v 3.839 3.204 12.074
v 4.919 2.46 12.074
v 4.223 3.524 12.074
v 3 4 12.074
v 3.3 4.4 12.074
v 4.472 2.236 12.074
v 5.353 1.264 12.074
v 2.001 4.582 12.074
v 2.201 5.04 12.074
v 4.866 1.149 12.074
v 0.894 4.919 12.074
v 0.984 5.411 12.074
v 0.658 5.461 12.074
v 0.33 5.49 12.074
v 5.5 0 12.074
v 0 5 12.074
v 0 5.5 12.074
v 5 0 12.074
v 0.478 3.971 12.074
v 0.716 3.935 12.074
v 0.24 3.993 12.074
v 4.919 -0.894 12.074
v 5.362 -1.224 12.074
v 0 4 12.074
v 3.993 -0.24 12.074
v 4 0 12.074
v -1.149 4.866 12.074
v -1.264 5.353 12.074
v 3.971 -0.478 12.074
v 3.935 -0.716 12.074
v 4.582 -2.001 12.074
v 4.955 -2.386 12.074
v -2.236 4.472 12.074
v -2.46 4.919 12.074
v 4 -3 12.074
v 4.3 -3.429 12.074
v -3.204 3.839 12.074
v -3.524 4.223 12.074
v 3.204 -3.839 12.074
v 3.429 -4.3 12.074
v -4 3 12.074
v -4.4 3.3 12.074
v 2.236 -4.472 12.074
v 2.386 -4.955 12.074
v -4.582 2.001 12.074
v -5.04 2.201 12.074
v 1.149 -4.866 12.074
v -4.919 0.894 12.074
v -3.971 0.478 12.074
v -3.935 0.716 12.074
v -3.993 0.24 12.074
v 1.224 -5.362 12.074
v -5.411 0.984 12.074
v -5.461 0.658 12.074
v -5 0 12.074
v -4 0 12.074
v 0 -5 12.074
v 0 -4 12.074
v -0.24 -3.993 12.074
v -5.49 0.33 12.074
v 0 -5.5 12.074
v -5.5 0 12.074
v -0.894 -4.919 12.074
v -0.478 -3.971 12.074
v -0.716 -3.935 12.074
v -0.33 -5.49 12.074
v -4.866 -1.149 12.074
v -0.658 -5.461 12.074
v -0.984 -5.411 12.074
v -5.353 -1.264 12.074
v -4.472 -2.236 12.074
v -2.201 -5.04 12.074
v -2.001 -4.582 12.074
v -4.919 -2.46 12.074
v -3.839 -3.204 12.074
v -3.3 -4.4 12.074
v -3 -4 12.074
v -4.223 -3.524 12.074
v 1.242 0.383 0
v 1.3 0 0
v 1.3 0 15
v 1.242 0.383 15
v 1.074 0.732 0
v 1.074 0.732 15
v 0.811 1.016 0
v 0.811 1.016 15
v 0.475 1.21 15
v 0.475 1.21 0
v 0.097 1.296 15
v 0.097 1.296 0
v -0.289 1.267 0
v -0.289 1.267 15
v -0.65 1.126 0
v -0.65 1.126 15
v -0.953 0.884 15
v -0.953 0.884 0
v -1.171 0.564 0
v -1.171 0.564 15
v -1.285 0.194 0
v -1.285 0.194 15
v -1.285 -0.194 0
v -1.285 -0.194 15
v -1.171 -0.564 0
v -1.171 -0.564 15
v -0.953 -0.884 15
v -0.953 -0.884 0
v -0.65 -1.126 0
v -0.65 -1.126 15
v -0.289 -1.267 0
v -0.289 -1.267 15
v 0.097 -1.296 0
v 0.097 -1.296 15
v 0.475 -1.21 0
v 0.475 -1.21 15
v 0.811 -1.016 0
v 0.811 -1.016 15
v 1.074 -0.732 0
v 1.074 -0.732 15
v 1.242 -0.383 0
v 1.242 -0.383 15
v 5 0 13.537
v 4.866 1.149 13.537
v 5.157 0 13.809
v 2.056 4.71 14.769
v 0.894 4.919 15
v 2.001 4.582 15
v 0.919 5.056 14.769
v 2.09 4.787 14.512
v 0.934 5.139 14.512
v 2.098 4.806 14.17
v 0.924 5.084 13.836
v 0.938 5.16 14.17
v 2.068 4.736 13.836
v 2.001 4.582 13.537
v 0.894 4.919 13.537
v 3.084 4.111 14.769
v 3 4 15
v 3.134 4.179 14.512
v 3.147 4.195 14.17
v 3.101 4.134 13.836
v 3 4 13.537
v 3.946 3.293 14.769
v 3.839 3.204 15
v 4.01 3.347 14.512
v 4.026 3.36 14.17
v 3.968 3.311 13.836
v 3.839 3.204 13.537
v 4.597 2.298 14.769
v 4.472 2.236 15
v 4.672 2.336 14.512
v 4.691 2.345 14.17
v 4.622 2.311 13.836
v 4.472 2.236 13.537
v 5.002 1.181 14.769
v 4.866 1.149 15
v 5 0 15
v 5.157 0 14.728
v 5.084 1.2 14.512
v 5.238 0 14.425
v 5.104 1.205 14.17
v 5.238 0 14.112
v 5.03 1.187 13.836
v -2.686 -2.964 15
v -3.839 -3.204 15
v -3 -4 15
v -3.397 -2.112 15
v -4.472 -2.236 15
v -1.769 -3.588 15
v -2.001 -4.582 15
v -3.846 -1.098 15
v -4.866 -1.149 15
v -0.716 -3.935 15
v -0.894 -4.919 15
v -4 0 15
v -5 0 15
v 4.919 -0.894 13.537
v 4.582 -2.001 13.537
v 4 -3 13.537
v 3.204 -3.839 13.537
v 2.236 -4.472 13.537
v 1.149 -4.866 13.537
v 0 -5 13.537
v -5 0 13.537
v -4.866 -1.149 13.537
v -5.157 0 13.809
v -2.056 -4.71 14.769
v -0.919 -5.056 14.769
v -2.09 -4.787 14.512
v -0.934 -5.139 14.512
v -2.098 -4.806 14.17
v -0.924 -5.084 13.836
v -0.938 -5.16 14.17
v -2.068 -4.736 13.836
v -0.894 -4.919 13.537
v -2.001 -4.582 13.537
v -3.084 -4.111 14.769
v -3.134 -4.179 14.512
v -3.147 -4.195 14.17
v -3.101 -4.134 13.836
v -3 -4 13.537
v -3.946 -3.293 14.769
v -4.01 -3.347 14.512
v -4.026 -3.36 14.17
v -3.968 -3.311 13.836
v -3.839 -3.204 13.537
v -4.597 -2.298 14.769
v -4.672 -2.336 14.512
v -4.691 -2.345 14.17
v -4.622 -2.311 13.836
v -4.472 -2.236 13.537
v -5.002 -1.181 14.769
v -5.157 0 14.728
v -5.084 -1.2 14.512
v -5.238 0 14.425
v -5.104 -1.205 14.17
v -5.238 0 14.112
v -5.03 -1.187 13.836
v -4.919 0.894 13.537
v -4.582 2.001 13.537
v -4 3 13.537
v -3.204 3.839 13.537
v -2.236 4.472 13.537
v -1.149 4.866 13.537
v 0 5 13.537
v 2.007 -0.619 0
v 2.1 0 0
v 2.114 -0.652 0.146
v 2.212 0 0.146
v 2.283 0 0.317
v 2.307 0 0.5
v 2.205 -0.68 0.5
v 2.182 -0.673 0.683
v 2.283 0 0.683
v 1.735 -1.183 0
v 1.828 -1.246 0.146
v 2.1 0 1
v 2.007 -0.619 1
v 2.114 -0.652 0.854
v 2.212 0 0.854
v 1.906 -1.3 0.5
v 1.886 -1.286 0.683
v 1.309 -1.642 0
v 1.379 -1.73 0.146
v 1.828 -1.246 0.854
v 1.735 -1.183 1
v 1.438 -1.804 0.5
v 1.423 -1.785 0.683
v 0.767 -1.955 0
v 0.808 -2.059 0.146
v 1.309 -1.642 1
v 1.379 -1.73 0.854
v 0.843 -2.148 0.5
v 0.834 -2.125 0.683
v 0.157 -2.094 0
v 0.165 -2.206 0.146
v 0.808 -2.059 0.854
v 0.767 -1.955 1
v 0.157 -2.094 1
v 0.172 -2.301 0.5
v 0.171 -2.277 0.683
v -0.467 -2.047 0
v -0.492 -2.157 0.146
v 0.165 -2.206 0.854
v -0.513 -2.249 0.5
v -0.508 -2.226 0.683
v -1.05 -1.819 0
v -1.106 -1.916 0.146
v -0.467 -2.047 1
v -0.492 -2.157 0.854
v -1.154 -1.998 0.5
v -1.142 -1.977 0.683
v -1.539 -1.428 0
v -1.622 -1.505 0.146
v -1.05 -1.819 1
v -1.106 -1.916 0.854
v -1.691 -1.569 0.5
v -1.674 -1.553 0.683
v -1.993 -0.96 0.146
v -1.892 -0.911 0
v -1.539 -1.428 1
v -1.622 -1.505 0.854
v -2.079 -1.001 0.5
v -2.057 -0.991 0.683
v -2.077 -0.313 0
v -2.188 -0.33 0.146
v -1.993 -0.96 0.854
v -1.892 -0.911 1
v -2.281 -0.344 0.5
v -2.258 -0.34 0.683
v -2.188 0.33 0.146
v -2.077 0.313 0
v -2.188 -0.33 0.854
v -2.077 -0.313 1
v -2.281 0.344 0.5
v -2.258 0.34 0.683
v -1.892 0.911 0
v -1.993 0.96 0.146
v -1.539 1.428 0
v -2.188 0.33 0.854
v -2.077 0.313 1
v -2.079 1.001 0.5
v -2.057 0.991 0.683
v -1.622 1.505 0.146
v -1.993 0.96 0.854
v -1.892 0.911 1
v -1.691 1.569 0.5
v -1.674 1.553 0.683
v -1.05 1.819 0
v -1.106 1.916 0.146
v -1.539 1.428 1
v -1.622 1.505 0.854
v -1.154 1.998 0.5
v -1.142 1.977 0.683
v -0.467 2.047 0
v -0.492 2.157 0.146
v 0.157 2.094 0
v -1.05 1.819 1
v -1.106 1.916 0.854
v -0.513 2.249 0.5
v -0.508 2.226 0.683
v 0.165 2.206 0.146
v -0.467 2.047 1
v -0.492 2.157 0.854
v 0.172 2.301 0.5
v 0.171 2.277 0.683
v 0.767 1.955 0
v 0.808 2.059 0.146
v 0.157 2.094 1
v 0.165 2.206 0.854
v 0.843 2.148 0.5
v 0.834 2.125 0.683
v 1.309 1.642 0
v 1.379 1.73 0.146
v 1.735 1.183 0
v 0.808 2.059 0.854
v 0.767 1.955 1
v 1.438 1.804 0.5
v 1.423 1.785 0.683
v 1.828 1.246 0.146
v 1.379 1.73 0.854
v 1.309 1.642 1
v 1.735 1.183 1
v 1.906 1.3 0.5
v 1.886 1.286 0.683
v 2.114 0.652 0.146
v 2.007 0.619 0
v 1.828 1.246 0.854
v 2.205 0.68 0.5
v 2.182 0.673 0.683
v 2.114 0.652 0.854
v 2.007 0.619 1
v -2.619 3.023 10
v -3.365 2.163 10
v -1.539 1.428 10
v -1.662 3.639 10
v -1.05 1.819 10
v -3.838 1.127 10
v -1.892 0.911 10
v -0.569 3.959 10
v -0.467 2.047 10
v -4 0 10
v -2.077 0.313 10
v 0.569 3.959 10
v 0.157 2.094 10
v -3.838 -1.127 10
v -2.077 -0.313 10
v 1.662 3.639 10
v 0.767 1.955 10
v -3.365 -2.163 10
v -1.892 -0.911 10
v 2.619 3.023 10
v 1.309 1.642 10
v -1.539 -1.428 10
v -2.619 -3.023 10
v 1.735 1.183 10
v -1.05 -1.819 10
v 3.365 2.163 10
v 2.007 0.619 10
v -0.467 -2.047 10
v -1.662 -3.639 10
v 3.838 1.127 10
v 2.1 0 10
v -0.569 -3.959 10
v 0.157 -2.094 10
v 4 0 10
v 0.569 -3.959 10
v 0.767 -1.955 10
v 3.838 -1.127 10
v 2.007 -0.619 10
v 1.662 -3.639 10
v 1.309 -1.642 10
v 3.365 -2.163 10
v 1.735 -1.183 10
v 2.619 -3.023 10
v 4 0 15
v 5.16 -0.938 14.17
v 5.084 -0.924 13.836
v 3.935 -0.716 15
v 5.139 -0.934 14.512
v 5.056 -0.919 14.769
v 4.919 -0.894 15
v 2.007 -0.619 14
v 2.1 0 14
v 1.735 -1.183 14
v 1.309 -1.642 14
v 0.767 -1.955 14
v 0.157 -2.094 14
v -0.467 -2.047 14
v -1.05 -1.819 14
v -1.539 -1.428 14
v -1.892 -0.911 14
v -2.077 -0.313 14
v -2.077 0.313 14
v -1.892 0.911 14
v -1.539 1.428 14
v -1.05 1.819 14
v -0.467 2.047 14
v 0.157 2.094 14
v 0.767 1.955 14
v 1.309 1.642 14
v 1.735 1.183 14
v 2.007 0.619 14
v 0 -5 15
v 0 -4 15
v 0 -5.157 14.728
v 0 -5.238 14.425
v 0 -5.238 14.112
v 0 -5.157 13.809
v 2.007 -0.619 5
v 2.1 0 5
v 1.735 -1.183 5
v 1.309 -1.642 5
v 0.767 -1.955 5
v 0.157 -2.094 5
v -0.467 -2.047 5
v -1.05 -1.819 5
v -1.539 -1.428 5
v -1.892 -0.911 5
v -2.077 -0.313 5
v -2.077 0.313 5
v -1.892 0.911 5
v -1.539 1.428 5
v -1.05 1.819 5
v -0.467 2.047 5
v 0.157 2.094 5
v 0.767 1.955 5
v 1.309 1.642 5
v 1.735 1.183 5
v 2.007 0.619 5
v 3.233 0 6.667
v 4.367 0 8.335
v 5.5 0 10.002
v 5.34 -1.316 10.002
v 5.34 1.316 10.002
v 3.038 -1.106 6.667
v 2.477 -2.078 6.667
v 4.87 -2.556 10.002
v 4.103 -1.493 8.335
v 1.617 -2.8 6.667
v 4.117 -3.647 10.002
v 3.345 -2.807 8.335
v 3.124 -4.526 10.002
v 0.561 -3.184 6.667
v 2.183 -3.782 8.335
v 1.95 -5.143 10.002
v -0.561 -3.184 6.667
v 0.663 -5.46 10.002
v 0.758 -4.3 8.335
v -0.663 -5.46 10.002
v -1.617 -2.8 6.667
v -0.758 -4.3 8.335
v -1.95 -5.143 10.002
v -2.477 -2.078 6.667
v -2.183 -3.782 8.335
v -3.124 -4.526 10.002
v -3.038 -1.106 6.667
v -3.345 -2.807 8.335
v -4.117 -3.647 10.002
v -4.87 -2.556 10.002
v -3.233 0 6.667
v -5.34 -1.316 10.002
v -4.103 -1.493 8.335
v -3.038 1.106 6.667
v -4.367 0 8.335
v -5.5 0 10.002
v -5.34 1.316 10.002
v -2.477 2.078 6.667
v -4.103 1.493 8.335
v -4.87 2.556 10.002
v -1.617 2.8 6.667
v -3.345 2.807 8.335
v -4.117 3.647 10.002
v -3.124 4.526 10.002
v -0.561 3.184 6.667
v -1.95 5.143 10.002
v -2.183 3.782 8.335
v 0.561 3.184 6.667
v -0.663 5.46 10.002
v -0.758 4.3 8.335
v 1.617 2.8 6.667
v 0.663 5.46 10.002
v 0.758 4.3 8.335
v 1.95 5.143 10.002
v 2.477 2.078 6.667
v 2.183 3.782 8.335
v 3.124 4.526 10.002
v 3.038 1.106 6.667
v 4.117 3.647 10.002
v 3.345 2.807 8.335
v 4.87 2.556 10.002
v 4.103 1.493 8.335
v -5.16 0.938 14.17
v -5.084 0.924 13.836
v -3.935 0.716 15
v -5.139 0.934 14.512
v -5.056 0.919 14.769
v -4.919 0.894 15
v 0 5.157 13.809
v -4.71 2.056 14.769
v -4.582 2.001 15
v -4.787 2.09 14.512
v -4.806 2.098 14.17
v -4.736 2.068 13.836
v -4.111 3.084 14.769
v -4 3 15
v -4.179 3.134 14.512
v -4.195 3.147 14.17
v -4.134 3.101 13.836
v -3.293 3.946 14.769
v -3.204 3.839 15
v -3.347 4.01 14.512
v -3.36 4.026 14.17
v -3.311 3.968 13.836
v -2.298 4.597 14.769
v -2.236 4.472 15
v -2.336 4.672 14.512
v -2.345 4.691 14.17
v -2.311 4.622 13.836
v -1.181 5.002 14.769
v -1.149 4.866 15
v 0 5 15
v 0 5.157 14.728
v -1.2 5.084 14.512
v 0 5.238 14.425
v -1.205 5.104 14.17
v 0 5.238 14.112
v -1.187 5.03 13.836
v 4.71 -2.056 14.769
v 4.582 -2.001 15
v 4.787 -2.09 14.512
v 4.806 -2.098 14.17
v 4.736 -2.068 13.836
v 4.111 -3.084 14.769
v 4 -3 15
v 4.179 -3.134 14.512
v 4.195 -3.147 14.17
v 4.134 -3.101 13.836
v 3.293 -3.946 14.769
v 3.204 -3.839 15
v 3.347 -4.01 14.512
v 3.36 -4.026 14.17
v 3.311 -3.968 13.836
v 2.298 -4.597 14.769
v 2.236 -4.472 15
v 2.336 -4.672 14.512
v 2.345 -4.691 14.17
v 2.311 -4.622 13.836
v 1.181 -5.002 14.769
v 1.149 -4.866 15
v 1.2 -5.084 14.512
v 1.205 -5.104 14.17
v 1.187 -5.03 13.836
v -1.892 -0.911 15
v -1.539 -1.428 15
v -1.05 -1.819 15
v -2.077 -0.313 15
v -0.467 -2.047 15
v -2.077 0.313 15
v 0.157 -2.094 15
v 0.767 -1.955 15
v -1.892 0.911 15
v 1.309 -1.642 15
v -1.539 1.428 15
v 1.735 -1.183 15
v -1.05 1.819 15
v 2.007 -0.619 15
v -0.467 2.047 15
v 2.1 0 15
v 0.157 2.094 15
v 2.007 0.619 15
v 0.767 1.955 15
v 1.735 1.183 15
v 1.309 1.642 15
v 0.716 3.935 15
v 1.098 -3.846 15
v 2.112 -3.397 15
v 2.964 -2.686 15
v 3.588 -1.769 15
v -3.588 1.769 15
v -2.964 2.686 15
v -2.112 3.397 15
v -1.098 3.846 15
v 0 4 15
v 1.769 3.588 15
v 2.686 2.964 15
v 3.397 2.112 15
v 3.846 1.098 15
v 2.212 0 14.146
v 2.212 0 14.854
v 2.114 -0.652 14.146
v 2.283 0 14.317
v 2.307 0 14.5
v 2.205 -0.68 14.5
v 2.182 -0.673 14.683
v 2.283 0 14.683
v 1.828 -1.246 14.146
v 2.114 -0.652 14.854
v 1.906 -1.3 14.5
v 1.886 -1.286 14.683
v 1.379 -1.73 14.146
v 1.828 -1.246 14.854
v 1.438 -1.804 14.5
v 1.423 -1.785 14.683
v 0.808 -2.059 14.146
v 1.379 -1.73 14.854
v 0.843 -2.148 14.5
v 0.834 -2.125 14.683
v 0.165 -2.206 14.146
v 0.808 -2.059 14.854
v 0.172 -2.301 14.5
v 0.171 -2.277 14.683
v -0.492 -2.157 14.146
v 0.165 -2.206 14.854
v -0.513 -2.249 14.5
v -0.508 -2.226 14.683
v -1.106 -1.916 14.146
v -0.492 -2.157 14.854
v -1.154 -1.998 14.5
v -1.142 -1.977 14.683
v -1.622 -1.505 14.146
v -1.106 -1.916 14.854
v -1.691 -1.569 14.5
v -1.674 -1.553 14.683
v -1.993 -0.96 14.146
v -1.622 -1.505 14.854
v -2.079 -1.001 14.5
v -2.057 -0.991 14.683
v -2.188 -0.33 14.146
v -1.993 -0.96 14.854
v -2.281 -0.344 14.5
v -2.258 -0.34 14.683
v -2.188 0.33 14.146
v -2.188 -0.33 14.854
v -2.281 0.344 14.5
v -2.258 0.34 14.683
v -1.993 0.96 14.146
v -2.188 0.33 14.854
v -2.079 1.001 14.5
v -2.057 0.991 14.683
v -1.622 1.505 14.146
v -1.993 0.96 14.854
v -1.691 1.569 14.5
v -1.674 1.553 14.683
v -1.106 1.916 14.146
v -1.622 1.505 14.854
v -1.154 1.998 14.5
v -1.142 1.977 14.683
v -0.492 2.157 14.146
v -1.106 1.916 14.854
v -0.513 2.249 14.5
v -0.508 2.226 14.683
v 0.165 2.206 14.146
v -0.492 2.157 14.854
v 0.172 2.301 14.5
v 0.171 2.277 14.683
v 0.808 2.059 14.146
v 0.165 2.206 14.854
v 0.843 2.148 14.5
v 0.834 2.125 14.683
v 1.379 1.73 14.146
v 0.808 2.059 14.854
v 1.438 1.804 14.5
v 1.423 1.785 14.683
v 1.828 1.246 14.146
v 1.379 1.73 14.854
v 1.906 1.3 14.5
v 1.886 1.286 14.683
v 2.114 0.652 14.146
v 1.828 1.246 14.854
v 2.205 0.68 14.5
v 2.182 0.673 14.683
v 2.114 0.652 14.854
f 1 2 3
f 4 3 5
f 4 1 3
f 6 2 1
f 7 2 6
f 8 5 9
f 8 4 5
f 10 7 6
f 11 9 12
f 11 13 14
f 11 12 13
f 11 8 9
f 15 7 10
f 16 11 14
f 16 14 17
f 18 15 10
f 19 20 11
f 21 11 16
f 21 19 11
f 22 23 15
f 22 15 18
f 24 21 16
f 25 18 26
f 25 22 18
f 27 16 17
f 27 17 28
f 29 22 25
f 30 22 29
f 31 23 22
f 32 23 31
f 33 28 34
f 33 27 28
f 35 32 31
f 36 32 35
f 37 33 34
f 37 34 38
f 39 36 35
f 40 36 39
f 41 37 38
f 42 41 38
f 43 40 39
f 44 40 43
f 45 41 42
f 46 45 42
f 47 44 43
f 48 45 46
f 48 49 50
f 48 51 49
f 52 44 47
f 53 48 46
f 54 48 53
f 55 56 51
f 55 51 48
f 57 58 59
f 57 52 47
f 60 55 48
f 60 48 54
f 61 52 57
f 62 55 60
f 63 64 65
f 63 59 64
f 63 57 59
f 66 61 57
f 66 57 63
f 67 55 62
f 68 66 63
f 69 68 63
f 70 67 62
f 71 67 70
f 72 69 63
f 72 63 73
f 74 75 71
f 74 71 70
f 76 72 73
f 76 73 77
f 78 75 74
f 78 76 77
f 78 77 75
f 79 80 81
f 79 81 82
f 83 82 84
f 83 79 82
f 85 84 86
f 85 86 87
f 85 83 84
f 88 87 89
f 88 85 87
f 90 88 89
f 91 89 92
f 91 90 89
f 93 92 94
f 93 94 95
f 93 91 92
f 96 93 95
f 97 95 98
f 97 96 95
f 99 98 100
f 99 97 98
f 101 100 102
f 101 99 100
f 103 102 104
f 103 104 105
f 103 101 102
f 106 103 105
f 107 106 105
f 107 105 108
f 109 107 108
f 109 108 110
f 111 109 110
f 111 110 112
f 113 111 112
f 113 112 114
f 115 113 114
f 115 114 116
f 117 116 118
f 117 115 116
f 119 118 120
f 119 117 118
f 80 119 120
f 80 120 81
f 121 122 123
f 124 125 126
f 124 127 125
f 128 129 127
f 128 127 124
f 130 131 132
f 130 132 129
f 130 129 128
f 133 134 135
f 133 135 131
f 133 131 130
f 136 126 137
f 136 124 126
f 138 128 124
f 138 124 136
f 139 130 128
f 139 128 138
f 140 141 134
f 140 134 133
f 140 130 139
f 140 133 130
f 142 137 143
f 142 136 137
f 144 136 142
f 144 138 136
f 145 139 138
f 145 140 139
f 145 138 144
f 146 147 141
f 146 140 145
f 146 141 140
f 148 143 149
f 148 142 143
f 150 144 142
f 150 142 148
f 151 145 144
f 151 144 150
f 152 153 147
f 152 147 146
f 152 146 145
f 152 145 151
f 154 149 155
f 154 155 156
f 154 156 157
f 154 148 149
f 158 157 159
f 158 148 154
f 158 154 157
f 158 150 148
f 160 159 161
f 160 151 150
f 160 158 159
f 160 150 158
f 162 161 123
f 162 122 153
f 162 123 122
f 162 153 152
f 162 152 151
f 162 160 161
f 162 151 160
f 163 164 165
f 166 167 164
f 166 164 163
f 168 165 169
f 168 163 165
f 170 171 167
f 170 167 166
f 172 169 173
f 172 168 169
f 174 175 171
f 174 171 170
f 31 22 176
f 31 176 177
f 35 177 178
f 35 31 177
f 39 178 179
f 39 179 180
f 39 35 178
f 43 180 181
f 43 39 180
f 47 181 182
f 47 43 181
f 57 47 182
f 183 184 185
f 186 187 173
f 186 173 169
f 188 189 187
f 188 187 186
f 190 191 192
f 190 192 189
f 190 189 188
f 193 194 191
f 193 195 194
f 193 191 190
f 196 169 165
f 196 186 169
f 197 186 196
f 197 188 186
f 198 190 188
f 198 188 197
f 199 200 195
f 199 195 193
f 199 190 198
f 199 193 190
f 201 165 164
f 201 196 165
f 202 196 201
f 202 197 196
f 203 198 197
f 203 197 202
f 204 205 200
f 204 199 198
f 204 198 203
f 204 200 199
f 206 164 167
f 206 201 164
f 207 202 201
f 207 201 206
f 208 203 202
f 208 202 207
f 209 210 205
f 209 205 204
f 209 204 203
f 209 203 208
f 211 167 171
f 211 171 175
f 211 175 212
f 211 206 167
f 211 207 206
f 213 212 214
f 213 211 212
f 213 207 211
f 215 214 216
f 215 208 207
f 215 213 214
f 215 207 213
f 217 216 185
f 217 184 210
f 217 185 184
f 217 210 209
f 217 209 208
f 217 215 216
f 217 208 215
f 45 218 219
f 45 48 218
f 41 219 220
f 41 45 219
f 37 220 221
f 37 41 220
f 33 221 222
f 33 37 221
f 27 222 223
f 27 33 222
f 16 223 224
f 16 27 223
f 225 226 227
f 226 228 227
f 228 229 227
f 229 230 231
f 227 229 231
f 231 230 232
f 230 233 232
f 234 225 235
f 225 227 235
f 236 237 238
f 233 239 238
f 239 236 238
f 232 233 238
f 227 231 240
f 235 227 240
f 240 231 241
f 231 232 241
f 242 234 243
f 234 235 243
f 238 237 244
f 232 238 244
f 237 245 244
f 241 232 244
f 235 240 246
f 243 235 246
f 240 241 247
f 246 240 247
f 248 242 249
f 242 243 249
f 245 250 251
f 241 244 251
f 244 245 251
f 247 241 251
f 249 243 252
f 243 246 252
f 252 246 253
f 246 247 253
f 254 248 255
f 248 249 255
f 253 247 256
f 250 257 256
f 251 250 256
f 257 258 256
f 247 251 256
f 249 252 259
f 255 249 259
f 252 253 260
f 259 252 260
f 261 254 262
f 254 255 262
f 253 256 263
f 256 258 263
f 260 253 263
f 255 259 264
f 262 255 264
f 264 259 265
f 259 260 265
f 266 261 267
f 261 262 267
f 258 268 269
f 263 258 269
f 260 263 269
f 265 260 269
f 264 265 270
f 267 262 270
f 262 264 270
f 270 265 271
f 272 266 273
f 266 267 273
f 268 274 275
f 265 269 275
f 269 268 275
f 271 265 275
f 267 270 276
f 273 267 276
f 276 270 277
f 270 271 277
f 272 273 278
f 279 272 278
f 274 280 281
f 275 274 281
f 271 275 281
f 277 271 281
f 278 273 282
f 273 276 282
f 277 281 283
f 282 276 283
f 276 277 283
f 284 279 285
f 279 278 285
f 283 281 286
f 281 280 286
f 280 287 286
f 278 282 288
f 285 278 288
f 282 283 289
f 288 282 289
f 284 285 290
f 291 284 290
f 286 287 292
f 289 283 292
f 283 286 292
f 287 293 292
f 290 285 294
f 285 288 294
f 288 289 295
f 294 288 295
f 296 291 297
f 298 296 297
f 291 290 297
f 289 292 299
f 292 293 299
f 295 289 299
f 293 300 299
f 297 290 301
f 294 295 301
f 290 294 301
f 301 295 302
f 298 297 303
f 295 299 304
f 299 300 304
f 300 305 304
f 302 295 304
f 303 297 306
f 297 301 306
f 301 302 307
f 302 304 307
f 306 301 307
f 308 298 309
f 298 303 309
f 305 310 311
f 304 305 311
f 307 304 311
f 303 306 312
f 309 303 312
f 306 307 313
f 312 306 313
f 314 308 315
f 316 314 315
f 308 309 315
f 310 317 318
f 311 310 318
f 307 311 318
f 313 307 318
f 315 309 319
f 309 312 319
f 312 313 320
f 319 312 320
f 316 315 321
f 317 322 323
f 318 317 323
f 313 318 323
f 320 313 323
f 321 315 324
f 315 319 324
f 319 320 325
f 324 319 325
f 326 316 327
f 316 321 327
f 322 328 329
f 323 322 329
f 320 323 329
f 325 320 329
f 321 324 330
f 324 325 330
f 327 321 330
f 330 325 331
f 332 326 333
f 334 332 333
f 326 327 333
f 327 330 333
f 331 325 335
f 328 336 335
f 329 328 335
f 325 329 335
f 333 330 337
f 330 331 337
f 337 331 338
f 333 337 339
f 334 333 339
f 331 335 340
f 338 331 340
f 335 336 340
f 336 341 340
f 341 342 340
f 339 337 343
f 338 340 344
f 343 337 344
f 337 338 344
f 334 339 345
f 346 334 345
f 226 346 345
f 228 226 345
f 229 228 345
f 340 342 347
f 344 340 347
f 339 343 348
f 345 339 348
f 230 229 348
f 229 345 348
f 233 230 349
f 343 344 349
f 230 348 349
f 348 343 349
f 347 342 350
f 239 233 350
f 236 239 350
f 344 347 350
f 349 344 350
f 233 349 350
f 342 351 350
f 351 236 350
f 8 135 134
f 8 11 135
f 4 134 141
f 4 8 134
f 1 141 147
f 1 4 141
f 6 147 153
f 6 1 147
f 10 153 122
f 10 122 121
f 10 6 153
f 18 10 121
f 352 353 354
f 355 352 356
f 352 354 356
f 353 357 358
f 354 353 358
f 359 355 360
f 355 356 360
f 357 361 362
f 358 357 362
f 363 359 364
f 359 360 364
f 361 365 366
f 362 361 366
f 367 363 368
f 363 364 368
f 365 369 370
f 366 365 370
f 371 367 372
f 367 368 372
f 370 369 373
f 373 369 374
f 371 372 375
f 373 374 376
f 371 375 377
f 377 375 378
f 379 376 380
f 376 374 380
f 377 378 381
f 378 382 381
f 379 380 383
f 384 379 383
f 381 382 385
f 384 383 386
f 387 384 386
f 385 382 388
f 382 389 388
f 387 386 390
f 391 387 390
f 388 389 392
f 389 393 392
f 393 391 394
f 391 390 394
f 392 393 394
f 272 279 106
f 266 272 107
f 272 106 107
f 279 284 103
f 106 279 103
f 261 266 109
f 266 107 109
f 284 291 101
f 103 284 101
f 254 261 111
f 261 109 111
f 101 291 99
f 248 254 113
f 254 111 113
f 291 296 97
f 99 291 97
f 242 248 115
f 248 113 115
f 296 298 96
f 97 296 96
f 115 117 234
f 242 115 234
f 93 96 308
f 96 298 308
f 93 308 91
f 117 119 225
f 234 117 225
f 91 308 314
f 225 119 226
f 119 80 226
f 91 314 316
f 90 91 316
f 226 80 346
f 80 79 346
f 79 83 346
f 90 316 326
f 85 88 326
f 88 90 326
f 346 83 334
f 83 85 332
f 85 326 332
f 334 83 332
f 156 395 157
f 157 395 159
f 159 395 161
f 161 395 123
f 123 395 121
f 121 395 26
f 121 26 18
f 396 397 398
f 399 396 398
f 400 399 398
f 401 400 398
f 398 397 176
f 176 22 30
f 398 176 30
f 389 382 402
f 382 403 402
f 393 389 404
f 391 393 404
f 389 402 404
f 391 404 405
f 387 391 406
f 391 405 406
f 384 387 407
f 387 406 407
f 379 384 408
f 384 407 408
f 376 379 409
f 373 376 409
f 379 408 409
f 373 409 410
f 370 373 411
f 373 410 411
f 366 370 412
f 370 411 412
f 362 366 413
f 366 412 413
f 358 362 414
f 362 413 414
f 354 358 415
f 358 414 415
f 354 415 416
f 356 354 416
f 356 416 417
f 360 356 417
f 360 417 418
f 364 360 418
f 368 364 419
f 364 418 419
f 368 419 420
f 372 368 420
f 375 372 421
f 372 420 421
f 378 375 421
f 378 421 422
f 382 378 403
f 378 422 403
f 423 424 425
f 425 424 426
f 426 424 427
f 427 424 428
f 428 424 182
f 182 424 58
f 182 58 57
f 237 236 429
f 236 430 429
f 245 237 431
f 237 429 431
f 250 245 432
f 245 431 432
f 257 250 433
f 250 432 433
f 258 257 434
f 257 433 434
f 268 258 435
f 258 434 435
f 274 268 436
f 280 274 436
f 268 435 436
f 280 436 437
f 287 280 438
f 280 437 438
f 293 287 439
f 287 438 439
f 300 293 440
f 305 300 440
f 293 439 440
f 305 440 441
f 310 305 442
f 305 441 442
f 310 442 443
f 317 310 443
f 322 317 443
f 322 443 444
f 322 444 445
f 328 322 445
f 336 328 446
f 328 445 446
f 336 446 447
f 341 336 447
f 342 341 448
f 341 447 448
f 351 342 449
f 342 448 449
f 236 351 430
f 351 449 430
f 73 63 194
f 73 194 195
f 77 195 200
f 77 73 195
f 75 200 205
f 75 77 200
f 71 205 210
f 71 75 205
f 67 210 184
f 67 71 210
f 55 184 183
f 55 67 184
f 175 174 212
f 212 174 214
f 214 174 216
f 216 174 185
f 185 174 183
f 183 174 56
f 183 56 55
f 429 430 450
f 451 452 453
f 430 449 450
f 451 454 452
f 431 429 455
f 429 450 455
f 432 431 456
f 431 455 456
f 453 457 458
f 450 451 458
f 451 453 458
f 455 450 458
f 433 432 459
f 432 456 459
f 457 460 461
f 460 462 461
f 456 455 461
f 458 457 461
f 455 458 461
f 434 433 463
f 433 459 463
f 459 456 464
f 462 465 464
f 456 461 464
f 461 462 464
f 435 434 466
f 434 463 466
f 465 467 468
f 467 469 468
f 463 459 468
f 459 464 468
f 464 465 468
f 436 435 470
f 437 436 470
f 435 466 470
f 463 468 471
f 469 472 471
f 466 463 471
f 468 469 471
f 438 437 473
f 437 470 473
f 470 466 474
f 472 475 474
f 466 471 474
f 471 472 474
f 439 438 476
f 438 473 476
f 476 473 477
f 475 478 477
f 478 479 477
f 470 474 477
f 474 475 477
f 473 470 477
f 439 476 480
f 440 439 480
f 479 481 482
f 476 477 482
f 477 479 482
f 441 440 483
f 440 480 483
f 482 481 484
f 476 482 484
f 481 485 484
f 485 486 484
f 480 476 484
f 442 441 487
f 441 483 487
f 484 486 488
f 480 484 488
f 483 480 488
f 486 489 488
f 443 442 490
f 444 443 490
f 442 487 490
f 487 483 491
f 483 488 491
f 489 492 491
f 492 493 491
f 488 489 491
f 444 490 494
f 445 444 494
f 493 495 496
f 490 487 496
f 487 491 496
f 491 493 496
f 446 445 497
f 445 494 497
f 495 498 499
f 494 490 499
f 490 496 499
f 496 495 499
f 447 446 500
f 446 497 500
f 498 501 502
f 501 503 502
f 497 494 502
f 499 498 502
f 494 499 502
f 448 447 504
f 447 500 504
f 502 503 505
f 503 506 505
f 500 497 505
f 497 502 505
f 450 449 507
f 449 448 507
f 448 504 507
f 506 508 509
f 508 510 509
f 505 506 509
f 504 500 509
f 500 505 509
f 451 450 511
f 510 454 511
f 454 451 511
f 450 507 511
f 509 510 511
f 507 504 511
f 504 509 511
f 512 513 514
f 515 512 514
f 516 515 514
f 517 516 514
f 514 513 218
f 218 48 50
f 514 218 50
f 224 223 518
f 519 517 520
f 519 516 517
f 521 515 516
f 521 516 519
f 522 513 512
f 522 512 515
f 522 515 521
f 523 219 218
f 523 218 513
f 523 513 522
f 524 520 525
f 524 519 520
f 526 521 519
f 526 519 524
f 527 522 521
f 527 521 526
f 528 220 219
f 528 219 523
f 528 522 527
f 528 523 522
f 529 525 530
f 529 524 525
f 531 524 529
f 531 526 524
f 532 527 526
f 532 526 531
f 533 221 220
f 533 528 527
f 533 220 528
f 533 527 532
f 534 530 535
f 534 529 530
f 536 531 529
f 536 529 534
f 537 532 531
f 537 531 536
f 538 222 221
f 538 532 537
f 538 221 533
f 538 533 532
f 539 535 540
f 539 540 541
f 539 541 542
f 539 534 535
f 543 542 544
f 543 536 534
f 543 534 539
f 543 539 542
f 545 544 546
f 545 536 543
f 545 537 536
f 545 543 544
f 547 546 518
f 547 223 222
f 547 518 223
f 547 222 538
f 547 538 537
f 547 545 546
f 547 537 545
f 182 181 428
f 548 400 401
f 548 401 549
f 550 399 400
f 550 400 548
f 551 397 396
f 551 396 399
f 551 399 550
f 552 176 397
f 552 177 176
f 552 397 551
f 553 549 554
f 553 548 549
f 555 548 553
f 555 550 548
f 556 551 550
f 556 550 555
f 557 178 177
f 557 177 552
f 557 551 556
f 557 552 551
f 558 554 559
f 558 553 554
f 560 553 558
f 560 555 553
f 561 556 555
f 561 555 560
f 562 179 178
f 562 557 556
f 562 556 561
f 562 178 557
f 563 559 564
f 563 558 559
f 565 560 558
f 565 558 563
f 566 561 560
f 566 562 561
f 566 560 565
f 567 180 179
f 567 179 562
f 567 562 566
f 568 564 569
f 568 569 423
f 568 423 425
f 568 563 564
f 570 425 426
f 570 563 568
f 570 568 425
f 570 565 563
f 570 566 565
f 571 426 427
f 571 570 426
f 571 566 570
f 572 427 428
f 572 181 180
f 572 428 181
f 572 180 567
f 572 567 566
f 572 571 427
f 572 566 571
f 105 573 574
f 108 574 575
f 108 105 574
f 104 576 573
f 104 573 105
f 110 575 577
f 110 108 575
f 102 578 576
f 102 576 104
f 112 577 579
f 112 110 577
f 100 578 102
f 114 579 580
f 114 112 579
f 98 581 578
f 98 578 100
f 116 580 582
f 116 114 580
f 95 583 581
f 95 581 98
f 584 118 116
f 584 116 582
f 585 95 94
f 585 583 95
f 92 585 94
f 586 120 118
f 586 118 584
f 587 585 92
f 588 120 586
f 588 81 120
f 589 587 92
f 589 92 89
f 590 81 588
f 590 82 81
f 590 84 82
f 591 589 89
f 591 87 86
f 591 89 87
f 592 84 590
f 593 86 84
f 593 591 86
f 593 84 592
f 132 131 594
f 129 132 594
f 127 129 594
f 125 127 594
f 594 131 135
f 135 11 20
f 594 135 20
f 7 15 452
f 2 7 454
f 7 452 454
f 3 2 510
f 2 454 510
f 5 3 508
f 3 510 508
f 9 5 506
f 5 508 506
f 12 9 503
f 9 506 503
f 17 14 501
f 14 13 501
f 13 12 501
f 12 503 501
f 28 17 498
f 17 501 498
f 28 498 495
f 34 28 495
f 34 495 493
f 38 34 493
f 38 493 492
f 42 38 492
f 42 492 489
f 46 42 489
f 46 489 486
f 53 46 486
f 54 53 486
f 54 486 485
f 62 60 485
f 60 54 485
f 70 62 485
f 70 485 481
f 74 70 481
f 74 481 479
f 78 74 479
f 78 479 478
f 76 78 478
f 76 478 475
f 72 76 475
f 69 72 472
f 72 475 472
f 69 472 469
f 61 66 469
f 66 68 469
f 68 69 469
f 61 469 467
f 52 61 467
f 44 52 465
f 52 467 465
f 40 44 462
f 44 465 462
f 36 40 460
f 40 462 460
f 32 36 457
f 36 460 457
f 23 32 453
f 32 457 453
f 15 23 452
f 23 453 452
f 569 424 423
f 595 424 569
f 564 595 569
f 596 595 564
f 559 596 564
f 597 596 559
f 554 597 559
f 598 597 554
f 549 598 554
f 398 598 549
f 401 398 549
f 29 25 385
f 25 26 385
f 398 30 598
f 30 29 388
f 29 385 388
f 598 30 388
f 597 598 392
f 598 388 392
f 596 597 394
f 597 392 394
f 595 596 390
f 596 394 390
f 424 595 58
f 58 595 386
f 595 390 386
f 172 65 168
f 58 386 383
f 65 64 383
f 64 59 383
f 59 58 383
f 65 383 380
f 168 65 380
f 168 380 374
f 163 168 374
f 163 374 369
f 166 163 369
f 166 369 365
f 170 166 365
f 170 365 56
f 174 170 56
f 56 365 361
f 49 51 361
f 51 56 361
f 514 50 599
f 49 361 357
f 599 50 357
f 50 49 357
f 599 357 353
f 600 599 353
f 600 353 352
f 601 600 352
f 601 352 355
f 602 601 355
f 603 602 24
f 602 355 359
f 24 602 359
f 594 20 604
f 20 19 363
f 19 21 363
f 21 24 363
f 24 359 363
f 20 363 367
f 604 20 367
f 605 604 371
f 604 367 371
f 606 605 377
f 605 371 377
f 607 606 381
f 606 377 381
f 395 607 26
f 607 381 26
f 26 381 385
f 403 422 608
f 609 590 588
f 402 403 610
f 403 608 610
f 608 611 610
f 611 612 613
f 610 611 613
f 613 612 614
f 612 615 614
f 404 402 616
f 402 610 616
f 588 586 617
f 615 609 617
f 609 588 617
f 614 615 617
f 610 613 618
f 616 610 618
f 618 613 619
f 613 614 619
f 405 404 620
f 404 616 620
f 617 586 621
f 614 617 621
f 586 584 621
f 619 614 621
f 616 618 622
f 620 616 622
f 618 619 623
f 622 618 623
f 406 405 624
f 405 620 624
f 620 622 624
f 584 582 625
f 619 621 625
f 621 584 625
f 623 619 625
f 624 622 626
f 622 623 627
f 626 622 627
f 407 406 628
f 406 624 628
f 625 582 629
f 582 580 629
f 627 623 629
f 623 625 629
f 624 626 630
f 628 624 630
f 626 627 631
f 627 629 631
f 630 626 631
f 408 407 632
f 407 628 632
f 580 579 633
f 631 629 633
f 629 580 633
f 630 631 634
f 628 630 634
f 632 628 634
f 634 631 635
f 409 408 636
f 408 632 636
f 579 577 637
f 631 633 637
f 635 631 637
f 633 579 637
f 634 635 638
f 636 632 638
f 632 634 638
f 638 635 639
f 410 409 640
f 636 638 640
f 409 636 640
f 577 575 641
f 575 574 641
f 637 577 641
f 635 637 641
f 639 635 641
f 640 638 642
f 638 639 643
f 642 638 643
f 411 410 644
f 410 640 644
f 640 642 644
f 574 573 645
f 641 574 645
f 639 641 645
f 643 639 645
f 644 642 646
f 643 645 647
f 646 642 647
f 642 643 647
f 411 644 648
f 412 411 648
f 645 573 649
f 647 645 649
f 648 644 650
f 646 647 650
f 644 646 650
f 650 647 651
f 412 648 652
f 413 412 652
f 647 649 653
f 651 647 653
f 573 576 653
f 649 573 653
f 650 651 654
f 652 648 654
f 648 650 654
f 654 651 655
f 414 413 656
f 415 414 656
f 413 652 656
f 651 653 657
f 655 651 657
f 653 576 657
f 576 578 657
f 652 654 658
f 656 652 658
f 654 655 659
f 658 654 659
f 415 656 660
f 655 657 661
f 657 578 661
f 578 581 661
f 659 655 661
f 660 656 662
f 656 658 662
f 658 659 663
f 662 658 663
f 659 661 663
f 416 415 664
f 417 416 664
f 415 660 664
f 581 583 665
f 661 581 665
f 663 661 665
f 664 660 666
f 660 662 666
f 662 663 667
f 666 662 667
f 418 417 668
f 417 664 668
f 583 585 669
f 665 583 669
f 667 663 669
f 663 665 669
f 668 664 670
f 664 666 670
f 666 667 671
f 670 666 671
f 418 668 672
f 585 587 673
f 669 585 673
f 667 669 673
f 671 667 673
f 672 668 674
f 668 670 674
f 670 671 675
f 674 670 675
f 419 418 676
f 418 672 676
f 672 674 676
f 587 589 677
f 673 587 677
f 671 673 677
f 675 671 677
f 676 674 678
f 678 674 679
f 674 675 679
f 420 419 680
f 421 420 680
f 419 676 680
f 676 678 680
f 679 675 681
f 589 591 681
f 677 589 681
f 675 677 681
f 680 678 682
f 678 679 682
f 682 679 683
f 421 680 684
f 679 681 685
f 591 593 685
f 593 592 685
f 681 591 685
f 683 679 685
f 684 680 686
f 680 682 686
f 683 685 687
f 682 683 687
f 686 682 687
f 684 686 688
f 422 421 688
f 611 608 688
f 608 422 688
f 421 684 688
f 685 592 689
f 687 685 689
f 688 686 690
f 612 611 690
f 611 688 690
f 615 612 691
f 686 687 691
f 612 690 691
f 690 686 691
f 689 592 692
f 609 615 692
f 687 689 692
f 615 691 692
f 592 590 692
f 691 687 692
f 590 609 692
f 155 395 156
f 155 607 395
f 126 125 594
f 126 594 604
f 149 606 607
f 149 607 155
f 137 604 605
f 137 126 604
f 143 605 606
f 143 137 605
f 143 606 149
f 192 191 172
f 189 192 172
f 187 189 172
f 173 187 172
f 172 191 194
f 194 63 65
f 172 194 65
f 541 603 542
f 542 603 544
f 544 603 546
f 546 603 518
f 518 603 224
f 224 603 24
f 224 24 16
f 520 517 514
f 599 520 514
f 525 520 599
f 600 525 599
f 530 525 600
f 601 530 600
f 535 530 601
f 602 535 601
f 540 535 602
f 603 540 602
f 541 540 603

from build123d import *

# Parameters (mm, degrees)
SKETCH1_R           = 5.5
SKETCH1_R_2         = 1.3
BOSS_EXTRUDE1_DEPTH = 15
CUT_EXTRUDE1_START  = -2.925993492
CUT_EXTRUDE1_DEPTH  = 2.925993492


with BuildPart() as part:
    # Sketch1 → Boss-Extrude1 (new body)
    with BuildSketch(Plane.XY):
        Circle(SKETCH1_R)
        Circle(SKETCH1_R_2, mode=Mode.SUBTRACT)
    extrude(amount=BOSS_EXTRUDE1_DEPTH)

    # Sketch3 → Cut-Revolve1 (revolve, cut)
    with BuildSketch(Plane(origin=(0, 0, 0), x_dir=(1, 0, 0), z_dir=(0, 1, 0)), mode=Mode.PRIVATE) as cut_revolve1_sk:
        with BuildLine():
            Line((-2.1, -5), (-5.5, -10.001935684))
            Line((-5.5, -10.001935684), (-5.5, 0))
            Line((-5.5, 0), (-2.1, 0))
            ThreePointArc((-2.1, 0), (-2.307106781, -0.5), (-2.1, -1))
            Line((-2.1, -1), (-2.1, -5))
        make_face()
        with BuildLine():
            Line((-2.1, -15), (-4, -15))
            Line((-4, -15), (-4, -10))
            Line((-4, -10), (-2.1, -10))
            Line((-2.1, -10), (-2.1, -14))
            ThreePointArc((-2.1, -14), (-2.307106781, -14.5), (-2.1, -15))
        make_face()
        with BuildLine():
            Line((-5.5, -15), (-5, -15))
            ThreePointArc((-5, -15), (-5.248310238, -14.268501627), (-5, -13.537003254))
            Line((-5, -13.537003254), (-5, -12.074006508))
            Line((-5, -12.074006508), (-5.5, -12.074006508))
            Line((-5.5, -12.074006508), (-5.5, -15))
        make_face()
    revolve(cut_revolve1_sk.sketch.rotate(Axis((0, 0, 15), (0, 0, -1)), 180), axis=Axis((0, 0, 15), (0, 0, -1)), mode=Mode.SUBTRACT)

    # Sketch4 → Cut-Extrude1 (cut)
    with BuildSketch(Plane.XY.offset(15).offset(CUT_EXTRUDE1_START)):
        with BuildLine():
            Line((0, -4), (0, -5.5))
            ThreePointArc((0, -5.5), (-0.493930774, -5.477776227), (-0.98386991, -5.411284506))
            Line((-0.98386991, -5.411284506), (-0.715541753, -3.93547964))
            ThreePointArc((-0.715541753, -3.93547964), (-0.359222381, -3.983837256), (0, -4))
        make_face()
        with BuildLine():
            Line((-4, 0), (-5.5, 0))
            ThreePointArc((-5.5, 0), (-5.477776227, 0.493930774), (-5.411284506, 0.98386991))
            Line((-5.411284506, 0.98386991), (-3.93547964, 0.715541753))
            ThreePointArc((-3.93547964, 0.715541753), (-3.983837256, 0.359222381), (-4, 0))
        make_face()
        with BuildLine():
            Line((0, 4), (0, 5.5))
            ThreePointArc((0, 5.5), (0.493930774, 5.477776227), (0.98386991, 5.411284506))
            Line((0.98386991, 5.411284506), (0.715541753, 3.93547964))
            ThreePointArc((0.715541753, 3.93547964), (0.359222381, 3.983837256), (0, 4))
        make_face()
        with BuildLine():
            Line((4, 0), (5.5, 0))
            ThreePointArc((5.5, 0), (5.477776227, -0.493930774), (5.411284506, -0.98386991))
            Line((5.411284506, -0.98386991), (3.93547964, -0.715541753))
            ThreePointArc((3.93547964, -0.715541753), (3.983837256, -0.359222381), (4, 0))
        make_face()
    extrude(amount=CUT_EXTRUDE1_DEPTH, mode=Mode.SUBTRACT)


solid = part.part
